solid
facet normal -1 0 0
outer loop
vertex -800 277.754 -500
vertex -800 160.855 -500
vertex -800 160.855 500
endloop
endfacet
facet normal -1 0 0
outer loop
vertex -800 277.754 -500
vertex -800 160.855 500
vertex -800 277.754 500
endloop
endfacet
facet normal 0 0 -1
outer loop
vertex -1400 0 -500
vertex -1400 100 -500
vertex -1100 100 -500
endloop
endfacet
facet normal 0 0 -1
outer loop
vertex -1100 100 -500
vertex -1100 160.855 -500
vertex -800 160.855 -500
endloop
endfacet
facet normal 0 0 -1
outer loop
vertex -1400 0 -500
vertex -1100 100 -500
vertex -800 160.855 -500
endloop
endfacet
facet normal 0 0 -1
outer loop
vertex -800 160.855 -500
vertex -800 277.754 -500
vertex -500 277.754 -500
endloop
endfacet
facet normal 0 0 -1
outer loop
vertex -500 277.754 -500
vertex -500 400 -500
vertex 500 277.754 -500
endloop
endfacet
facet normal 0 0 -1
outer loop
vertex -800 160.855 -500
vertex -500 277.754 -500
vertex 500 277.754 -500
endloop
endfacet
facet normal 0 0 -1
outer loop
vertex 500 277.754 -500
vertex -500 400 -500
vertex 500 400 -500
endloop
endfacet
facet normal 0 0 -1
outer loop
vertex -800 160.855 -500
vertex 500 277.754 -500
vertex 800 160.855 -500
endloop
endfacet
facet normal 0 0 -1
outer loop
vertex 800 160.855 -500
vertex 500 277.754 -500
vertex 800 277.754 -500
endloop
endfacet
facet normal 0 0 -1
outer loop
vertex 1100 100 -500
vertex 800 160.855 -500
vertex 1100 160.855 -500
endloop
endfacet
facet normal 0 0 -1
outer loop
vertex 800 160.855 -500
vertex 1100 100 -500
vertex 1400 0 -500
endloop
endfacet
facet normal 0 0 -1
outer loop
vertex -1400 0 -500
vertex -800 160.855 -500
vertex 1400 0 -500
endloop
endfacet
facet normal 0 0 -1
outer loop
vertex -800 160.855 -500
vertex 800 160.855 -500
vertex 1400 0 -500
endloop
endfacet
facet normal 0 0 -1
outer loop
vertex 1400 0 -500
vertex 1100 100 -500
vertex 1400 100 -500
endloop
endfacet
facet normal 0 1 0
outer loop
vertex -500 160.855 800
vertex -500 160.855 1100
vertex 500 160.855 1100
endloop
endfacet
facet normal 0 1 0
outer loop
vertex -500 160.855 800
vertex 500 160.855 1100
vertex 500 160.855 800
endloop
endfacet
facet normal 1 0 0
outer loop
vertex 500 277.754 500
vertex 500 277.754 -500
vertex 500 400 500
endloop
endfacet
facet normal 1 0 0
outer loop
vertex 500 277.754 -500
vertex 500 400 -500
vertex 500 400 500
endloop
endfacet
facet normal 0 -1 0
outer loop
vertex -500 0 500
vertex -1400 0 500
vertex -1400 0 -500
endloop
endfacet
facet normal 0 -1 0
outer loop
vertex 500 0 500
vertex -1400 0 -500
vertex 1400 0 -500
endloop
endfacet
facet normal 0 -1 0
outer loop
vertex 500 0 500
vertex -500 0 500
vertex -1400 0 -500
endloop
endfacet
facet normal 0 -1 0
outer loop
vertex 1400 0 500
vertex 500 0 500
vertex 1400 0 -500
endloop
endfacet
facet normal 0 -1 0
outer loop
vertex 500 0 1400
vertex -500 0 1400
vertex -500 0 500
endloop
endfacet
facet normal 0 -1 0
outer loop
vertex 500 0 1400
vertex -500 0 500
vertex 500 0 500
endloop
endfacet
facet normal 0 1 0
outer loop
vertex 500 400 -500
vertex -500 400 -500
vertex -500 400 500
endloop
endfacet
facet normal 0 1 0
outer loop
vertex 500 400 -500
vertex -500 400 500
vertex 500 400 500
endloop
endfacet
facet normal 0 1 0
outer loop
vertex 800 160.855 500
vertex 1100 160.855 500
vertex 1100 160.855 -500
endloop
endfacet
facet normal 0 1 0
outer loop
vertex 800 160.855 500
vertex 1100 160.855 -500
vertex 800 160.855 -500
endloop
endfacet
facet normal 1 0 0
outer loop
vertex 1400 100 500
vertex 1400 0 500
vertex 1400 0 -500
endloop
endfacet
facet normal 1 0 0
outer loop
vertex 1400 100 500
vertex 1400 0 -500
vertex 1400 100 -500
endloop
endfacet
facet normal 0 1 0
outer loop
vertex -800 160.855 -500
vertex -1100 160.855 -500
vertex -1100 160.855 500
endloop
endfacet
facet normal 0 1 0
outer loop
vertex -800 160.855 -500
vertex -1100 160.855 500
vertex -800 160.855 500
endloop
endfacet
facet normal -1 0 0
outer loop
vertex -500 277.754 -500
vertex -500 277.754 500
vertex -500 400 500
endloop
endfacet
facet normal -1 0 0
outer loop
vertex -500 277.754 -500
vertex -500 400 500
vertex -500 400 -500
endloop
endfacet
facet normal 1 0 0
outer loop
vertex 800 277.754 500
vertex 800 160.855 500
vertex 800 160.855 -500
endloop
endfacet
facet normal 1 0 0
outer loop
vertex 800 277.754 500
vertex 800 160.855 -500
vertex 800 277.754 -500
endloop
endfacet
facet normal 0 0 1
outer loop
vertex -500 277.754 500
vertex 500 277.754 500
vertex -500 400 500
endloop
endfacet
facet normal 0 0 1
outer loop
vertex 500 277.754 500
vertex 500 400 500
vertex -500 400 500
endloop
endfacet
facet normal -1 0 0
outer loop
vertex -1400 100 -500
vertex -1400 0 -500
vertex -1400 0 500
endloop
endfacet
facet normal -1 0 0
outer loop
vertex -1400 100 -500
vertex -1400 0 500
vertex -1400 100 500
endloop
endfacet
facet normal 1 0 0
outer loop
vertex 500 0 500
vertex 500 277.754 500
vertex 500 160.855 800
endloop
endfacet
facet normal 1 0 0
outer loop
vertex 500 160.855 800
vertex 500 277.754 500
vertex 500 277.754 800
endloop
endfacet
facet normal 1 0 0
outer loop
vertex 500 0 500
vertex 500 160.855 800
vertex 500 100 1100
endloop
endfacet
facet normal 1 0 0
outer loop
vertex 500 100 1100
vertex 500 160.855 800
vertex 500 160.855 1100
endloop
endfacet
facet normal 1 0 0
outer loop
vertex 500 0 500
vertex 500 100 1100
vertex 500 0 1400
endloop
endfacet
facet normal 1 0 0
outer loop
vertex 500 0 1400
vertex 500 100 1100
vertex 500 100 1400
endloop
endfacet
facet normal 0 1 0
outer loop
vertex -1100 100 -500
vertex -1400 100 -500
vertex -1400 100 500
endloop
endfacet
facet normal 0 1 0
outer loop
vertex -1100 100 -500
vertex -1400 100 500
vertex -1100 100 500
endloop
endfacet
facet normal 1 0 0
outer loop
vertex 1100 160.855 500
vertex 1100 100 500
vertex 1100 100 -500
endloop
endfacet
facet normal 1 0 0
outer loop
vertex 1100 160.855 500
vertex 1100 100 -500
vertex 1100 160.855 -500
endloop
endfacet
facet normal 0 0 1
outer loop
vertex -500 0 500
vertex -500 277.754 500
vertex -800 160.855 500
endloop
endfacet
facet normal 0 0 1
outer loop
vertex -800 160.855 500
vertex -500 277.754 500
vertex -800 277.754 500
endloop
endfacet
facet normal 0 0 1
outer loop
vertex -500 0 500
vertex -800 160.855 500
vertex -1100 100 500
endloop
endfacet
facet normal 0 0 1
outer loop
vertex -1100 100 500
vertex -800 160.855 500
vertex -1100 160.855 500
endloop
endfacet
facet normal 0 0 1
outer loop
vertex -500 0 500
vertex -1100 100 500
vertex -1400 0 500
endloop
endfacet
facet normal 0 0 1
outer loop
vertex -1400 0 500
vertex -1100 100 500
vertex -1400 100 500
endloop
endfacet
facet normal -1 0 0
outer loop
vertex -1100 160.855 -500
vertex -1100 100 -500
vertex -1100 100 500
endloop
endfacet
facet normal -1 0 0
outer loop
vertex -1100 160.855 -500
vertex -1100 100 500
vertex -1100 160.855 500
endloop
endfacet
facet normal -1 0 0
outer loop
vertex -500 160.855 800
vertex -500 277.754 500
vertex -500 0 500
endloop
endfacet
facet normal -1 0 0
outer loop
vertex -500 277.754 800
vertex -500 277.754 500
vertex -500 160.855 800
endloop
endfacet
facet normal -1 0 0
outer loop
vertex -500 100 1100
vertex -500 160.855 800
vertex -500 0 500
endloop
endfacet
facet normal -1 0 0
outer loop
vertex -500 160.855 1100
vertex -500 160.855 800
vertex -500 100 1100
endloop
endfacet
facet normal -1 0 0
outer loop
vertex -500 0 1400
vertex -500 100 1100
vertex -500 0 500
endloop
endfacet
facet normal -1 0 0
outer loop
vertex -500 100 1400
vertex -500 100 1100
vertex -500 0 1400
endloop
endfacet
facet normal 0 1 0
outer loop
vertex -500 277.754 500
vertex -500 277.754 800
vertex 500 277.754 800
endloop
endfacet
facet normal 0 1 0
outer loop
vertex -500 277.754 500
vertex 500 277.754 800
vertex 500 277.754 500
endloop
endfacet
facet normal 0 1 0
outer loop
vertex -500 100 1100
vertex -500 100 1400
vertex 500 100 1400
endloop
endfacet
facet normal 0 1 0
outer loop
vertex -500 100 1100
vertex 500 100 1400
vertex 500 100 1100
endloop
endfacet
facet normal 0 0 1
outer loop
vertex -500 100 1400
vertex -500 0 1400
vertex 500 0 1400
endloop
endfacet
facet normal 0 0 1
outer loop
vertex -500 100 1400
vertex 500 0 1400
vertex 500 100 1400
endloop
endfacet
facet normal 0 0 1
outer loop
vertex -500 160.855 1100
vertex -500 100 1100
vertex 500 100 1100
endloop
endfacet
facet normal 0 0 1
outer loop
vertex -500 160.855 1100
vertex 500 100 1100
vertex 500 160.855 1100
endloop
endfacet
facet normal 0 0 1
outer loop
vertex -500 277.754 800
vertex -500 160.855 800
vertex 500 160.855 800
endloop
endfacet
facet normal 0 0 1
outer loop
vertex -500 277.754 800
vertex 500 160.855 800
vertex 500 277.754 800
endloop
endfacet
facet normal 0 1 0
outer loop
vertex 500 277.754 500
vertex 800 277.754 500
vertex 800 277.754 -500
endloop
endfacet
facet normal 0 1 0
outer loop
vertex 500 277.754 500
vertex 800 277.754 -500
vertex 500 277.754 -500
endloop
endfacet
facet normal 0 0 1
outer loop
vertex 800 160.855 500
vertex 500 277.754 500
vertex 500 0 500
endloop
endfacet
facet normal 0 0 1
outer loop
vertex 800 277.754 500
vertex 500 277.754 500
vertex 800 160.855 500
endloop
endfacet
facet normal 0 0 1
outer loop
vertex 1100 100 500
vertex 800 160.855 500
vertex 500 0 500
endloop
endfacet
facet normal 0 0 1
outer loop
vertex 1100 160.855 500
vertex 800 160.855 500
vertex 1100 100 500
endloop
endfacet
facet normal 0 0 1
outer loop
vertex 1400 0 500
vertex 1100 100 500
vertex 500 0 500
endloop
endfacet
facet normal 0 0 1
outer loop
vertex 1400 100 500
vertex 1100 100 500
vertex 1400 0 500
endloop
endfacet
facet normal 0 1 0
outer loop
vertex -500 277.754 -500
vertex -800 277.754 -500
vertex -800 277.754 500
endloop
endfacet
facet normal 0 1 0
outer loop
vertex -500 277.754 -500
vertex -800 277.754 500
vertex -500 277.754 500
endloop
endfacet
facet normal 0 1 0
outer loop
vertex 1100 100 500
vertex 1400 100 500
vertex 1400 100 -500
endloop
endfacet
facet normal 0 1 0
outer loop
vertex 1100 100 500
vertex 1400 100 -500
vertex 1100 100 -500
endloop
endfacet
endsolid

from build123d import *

# Parameters (mm, degrees)
SKETCH_1_W      = 1000
SKETCH_1_H      = 1000
EXTRUDE_1_DEPTH = 400
EXTRUDE_2_DEPTH = 1000
EXTRUDE_3_DEPTH = 1000
EXTRUDE_4_DEPTH = 1000


with BuildPart() as part:
    # 草图1 → 凸台-拉伸1 (new body)
    with BuildSketch(Plane(origin=(0, 0, 0), x_dir=(1, 0, 0), z_dir=(0, 1, 0))):
        Rectangle(SKETCH_1_W, SKETCH_1_H)
    extrude(amount=EXTRUDE_1_DEPTH)

    # 草图2 → 凸台-拉伸2 (add)
    with BuildSketch(Plane(origin=(0, 0, -500), x_dir=(-1, 0, 0), z_dir=(0, 0, -1))):
        Polygon((500, 0), (1400, 0), (1400, 100), (1100, 100), (1100, 160.854960844), (800, 160.854960844), (800, 277.753844898), (500, 277.753844898), align=None)
    extrude(amount=-EXTRUDE_2_DEPTH)

    # 草图4 → 凸台-拉伸3 (add)
    with BuildSketch(Plane.ZY.offset(500)):
        Polygon((500, 0), (1400, 0), (1400, 100), (1100, 100), (1100, 160.854960844), (800, 160.854960844), (800, 277.753844898), (500, 277.753844898), align=None)
    extrude(amount=-EXTRUDE_3_DEPTH)

    # 草图5 → 凸台-拉伸4 (add)
    with BuildSketch(Plane.XY.offset(500)):
        Polygon((500, 0), (1400, 0), (1400, 100), (1100, 100), (1100, 160.854960844), (800, 160.854960844), (800, 277.753844898), (500, 277.753844898), align=None)
    extrude(amount=-EXTRUDE_4_DEPTH)


solid = part.part
